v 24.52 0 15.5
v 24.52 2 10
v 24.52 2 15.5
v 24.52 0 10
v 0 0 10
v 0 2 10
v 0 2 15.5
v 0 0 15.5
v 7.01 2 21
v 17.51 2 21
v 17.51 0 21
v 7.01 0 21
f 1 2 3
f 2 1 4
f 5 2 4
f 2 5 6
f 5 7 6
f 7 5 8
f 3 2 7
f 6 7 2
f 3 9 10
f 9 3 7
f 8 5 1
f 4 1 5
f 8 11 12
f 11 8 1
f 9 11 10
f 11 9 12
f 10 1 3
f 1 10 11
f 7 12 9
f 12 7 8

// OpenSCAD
width_tripod_asm=24.52;
top_width=10.5;
total_ht=11;
thick=2;

translate([0,0,10])
cutout_tripod_mount_support(width_tripod_asm, top_width, total_ht, thick);




module cutout_tripod_mount_support(width_tripod_asm, top_width, total_ht, thick)
{
    translate([width_tripod_asm/2, thick/2, total_ht/4])
    {
cube([width_tripod_asm, 2, total_ht/2],true);

translate([0,0,total_ht/2])
cube([top_width, thick, total_ht/2],true);

translate([top_width/2, 1, total_ht/4])
rotate([90,0,0])
linear_extrude(thick)
polygon(points = [ [(width_tripod_asm-top_width)/2,0],[0,total_ht/2], [0,0]]);

translate([-top_width/2, -1, total_ht/4])
rotate([90,0,180])
linear_extrude(thick)
polygon(points = [ [(width_tripod_asm-top_width)/2,0],[0,total_ht/2], [0,0]]);
    }
}
